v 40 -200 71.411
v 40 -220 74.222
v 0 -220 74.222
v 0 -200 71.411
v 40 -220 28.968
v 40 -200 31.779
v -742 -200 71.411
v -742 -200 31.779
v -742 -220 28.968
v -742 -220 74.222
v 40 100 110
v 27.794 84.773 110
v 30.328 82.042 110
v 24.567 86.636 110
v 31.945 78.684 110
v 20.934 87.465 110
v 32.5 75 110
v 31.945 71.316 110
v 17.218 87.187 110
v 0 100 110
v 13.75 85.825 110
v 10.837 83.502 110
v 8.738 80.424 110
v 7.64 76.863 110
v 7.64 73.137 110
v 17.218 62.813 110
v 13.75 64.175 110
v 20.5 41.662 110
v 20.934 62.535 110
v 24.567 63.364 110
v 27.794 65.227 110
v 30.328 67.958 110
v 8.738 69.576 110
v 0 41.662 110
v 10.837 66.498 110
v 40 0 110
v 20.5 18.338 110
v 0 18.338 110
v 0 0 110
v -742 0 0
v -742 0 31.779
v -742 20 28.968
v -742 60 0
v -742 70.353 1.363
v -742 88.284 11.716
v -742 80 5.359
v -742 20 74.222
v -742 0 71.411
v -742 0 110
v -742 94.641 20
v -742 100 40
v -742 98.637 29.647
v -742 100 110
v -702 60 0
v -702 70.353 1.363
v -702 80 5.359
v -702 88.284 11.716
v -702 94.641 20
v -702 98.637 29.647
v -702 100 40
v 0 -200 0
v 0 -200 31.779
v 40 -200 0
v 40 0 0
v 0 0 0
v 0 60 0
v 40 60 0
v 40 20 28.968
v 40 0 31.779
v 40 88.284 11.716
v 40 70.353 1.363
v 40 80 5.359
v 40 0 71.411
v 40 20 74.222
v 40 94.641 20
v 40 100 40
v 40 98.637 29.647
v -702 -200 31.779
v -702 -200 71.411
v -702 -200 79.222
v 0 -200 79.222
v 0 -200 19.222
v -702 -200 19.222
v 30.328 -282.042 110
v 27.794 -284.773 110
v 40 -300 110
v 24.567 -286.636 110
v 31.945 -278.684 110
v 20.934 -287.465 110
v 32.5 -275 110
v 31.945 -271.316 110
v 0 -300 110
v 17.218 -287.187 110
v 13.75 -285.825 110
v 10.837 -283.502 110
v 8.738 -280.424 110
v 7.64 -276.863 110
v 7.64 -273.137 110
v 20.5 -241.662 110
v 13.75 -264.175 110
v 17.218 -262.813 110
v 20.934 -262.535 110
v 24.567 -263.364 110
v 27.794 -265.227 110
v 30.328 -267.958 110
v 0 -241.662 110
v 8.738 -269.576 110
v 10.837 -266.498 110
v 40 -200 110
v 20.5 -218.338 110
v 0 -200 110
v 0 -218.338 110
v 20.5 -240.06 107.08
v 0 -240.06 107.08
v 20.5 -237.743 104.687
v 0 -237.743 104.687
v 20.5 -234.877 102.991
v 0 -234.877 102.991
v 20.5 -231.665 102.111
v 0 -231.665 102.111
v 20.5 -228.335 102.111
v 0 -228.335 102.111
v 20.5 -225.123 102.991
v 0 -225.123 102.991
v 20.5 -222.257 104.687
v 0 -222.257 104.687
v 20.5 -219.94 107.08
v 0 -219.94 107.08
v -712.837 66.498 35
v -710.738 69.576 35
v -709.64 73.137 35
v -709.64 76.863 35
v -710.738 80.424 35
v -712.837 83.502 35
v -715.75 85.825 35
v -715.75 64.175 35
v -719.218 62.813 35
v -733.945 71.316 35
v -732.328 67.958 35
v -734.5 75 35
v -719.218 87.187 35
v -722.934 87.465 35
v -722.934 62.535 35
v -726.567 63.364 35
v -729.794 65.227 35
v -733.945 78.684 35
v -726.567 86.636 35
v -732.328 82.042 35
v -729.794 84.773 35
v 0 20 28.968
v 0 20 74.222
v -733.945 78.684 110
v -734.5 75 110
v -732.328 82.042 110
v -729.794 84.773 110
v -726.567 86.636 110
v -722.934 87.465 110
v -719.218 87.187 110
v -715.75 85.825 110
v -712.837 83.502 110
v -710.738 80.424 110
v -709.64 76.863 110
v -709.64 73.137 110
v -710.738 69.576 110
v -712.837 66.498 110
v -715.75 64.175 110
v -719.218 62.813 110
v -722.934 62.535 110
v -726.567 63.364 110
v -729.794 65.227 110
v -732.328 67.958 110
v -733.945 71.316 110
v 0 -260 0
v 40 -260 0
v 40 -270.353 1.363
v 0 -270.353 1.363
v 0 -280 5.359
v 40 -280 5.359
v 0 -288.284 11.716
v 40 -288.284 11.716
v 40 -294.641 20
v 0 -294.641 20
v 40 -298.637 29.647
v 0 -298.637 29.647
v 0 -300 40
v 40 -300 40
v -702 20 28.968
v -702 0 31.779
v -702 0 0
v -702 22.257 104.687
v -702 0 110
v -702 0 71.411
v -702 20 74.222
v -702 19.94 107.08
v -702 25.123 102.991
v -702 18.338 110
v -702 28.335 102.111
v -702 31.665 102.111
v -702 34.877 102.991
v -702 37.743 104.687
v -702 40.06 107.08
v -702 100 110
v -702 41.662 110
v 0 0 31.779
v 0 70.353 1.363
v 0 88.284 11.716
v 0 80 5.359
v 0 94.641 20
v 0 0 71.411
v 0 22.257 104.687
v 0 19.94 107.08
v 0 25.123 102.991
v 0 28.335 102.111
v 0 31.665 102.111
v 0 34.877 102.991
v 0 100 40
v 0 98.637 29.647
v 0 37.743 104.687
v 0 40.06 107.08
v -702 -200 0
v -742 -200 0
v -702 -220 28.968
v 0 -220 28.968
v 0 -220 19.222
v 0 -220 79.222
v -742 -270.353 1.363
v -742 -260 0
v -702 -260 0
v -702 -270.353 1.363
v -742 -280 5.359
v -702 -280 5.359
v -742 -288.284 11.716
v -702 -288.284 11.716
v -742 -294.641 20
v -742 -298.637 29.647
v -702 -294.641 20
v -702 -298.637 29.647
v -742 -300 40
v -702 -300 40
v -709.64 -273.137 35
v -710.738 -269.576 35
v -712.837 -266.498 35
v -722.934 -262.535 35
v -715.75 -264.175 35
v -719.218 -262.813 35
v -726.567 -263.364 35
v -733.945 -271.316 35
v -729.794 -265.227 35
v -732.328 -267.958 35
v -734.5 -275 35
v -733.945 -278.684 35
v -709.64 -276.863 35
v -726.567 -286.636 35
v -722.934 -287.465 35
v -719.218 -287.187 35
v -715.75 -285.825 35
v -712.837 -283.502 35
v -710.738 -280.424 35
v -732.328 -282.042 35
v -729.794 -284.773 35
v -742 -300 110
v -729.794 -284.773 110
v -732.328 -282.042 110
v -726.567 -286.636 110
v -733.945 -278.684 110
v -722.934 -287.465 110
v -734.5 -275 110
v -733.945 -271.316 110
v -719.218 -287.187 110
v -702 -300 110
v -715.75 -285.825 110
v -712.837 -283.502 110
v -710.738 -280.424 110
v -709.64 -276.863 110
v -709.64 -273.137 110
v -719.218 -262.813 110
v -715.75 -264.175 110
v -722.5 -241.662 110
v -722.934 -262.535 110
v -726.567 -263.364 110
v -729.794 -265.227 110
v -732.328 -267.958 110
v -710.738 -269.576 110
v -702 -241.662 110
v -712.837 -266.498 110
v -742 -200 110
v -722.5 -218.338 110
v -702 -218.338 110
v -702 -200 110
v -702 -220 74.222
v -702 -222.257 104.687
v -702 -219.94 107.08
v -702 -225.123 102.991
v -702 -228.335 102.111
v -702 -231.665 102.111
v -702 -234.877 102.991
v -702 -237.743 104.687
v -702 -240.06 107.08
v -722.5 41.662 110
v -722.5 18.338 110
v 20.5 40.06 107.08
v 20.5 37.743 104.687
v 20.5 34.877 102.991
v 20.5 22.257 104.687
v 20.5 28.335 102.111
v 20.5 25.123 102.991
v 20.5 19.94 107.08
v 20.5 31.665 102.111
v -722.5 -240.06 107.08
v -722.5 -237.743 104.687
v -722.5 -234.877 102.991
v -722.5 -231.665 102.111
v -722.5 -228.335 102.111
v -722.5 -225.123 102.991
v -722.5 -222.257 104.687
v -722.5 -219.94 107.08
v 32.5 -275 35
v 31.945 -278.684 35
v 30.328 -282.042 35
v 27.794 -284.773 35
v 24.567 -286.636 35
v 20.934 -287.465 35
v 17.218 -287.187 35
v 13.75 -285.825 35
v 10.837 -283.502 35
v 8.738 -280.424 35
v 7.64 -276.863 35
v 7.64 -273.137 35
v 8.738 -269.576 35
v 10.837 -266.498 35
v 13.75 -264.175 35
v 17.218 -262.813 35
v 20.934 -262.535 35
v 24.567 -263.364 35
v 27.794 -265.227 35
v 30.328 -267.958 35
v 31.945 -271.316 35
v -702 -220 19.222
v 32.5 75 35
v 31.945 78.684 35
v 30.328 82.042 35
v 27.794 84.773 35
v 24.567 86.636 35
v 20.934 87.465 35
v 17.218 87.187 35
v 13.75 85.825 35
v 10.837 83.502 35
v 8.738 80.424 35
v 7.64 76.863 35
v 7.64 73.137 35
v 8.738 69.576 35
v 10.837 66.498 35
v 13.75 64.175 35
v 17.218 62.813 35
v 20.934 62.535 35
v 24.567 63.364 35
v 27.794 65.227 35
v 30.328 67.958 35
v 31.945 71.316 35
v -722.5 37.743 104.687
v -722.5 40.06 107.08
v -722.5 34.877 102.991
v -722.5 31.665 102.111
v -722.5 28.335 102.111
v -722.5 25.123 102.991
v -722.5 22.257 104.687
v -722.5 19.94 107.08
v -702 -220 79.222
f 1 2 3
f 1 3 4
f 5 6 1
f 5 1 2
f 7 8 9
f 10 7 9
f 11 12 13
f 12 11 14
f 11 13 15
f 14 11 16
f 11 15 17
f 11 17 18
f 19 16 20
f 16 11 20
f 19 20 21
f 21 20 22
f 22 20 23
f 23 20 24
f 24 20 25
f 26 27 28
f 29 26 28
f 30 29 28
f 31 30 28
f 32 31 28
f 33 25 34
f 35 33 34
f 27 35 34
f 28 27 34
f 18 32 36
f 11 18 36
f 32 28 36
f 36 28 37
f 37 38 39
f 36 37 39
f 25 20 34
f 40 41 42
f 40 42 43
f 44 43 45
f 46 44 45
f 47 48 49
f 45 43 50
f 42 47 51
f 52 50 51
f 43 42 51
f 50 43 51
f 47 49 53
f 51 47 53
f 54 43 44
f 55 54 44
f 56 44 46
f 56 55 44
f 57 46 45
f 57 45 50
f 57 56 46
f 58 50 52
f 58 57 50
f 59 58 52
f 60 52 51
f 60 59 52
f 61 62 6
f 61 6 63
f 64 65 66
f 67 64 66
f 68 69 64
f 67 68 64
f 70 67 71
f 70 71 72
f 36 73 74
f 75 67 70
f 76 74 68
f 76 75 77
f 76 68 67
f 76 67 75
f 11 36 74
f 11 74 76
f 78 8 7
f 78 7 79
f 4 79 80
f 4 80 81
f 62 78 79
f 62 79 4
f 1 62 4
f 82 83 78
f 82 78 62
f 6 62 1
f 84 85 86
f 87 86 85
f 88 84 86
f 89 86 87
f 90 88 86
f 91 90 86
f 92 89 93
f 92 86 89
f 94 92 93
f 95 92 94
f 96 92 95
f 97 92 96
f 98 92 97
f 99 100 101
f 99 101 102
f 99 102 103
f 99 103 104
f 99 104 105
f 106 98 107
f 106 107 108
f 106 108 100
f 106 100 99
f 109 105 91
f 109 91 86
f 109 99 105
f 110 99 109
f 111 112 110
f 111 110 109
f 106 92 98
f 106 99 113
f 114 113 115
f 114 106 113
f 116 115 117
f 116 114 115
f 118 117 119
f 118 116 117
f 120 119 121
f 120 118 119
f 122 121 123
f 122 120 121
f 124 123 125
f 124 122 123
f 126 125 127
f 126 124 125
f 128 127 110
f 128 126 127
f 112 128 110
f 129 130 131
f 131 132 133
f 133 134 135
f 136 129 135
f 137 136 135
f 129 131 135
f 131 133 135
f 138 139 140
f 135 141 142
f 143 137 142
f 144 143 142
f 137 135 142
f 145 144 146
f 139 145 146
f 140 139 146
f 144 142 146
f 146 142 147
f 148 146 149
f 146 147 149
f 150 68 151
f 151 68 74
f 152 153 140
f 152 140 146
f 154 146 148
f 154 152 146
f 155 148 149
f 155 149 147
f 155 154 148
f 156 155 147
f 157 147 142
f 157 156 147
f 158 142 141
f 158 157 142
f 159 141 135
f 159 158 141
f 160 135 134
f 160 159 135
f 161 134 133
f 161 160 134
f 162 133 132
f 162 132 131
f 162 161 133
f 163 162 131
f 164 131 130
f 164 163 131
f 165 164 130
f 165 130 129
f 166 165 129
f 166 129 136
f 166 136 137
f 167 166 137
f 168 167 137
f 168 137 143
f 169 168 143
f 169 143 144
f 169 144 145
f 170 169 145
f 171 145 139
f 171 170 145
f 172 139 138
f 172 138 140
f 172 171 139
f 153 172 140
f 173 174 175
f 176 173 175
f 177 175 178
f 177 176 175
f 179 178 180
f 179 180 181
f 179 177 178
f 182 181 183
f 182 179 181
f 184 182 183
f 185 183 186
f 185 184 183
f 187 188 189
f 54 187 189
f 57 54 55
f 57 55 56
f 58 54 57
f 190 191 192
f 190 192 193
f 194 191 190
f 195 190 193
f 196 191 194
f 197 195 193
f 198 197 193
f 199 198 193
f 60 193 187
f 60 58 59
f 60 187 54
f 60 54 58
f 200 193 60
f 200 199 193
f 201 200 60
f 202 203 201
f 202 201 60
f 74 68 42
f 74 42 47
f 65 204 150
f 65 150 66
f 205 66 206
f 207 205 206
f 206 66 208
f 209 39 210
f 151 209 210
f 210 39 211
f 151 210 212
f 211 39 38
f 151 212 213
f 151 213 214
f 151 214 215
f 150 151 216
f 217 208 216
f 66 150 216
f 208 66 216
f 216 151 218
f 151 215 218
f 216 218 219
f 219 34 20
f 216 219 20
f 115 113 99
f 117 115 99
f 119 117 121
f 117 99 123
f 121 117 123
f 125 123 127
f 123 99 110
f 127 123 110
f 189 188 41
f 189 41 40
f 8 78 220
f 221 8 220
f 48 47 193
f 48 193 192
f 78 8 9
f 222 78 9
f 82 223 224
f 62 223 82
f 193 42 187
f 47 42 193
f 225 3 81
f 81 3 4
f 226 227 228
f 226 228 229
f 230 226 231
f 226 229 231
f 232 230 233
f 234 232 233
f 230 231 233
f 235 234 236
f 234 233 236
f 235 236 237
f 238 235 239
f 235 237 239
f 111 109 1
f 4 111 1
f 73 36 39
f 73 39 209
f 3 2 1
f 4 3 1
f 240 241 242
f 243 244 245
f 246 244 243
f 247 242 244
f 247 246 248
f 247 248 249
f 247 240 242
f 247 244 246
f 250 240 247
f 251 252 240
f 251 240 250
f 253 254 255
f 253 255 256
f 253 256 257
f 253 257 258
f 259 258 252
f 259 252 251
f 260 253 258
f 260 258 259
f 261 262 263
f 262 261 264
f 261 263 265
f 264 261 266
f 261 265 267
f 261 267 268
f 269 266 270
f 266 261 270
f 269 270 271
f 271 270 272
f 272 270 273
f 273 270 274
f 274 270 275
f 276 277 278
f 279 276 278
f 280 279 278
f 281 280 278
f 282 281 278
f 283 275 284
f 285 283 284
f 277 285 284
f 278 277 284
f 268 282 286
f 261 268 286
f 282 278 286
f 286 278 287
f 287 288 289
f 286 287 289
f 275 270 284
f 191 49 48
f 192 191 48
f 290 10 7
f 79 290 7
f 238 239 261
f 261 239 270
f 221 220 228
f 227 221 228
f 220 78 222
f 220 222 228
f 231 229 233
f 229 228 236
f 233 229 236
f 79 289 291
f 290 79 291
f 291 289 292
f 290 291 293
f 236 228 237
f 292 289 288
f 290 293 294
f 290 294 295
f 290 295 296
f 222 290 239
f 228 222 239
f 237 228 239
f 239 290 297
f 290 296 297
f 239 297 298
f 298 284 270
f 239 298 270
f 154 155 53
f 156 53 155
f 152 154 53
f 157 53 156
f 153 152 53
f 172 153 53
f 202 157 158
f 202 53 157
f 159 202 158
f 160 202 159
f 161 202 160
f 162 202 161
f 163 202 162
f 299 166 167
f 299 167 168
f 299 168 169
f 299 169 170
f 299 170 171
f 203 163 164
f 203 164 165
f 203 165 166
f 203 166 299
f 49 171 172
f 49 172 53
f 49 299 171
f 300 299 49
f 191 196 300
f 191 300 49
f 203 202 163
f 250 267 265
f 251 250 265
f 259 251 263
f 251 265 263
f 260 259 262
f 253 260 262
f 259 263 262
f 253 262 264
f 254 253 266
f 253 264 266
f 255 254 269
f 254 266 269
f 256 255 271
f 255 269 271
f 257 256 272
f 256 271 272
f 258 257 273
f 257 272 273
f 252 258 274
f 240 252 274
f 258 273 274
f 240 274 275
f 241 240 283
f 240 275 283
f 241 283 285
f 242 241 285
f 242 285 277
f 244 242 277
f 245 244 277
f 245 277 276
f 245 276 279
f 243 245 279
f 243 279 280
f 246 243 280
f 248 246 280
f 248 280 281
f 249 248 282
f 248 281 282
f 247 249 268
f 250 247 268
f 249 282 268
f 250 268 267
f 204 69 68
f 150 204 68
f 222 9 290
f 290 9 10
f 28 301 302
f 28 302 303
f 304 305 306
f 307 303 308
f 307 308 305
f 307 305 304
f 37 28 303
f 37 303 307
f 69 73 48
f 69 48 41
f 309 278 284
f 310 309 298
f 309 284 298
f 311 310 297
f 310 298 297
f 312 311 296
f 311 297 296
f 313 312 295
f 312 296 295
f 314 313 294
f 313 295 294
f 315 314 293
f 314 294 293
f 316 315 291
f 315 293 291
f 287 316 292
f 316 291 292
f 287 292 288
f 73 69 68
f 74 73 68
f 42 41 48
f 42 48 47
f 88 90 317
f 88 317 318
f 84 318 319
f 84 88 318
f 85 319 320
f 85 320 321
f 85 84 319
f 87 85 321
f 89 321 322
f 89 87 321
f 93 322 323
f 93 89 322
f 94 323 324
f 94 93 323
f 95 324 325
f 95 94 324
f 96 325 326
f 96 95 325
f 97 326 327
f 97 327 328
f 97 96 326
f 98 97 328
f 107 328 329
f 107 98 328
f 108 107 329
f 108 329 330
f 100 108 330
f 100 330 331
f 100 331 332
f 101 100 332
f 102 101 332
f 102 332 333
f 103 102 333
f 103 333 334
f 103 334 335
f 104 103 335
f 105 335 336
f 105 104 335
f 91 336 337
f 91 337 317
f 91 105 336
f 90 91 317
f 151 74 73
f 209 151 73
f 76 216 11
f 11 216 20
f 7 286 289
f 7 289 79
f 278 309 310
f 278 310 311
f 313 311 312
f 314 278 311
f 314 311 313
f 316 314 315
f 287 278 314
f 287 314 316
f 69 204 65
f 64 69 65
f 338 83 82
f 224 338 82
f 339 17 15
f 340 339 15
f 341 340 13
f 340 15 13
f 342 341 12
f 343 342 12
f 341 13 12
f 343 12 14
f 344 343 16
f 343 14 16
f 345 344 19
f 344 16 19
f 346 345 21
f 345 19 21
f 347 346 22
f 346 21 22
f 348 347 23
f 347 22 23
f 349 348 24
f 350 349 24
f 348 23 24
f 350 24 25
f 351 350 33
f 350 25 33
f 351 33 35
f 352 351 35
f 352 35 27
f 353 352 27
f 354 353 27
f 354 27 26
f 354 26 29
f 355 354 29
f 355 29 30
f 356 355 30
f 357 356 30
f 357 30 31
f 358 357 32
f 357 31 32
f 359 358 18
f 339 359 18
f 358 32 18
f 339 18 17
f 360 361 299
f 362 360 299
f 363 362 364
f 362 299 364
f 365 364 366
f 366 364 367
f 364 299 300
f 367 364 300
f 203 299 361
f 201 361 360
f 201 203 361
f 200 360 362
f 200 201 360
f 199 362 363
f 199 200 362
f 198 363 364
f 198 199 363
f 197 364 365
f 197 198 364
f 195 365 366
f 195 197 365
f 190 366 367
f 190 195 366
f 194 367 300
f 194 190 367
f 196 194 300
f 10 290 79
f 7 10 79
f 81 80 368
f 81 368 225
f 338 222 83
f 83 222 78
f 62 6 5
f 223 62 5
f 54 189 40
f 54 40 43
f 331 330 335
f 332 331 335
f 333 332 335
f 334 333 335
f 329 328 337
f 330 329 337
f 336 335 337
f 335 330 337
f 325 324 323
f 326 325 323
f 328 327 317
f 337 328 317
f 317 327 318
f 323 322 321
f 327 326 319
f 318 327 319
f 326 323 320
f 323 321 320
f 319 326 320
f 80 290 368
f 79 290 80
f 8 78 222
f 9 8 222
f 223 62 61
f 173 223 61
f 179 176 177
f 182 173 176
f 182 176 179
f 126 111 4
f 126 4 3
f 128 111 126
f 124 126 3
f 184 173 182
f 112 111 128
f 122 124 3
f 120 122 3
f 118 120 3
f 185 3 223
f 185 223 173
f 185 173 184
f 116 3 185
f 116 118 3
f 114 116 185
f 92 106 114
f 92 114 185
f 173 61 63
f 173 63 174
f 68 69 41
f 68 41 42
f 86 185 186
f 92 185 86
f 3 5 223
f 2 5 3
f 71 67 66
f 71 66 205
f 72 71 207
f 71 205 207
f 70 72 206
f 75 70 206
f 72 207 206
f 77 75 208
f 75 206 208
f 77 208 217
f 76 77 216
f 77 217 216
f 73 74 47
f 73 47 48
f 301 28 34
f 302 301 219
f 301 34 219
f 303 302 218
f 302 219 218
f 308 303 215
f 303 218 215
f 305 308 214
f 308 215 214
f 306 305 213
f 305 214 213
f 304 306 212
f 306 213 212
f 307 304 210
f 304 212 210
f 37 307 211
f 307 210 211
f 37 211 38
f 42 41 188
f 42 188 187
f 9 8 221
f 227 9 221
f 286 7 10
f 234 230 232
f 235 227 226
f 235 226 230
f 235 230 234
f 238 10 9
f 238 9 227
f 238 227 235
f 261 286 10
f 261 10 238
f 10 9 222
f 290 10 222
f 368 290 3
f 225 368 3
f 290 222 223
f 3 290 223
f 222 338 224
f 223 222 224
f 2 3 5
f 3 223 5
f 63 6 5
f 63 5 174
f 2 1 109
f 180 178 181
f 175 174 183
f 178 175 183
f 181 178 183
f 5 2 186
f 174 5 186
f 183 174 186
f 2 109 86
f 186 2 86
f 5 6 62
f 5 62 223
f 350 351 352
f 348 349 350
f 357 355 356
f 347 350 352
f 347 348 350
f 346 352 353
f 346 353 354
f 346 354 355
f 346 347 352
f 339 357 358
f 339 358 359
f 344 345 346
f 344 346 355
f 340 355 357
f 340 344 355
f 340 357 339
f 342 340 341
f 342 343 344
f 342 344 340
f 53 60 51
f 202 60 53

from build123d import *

# Parameters (mm, degrees)
F1_DEPTH       = 40
F2_R           = 12.5
F3_DEPTH       = 75
F4_R           = 12.5
F5_DEPTH       = 20.5
F7_DEPTH       = 40.001
F10_DEPTH      = 782
F14_W          = 702
F14_H          = 20
F15_DEPTH      = 55
F15_DEPTH_BACK = 5


with BuildPart() as f1:
    # F0 (on Right) → F1 (new body)
    with BuildSketch(Plane.YZ):
        with BuildLine():
            Line((0, 110), (0, 0))
            Line((0, 0), (60, 0))
            ThreePointArc((60, 0), (88.2842712475, 11.7157287525), (100, 40))
            Line((100, 40), (100, 110))
            Line((100, 110), (0, 110))
        make_face()
    extrude(amount=F1_DEPTH)

    # F2 (on face) → F3 (cut)
    with BuildSketch(Plane.XY.offset(110)):
        with Locations((20, 75)):
            Circle(F2_R)
    extrude(amount=-F3_DEPTH, mode=Mode.SUBTRACT)

    # F4 (on face) → F5 (cut)
    with BuildSketch(Plane(origin=(0, 0, 0), x_dir=(0, -1, 0), z_dir=(-1, 0, 0))):
        with Locations((-30, 114.5)):
            Circle(F4_R)
    extrude(amount=-F5_DEPTH, mode=Mode.SUBTRACT)

    # F6 (on face) → F7 (cut, through all)
    with BuildSketch(Plane.YZ.offset(40)):
        Polygon((20, 74.2220271416), (0, 71.4112104475), (0, 56.4112104475), (0, 31.7791700363), (20, 28.9683533423), (20, 46.7791700363), (20, 56.4112104475), align=None)
    extrude(amount=-F7_DEPTH, mode=Mode.SUBTRACT)


with BuildPart() as f9_1:
    # F9: instance of F1
    add(f1.part.mirror(Plane.YZ.offset(-351)))


with BuildPart() as f10:
    # F6 (on face) → F10 (new body)
    with BuildSketch(Plane.YZ.offset(40)):
        Polygon((20, 74.2220271416), (0, 71.4112104475), (0, 56.4112104475), (0, 31.7791700363), (20, 28.9683533423), (20, 46.7791700363), (20, 56.4112104475), align=None)
    extrude(amount=-F10_DEPTH)


with BuildPart() as f12_1:
    # F12: instance of F1
    add(f1.part.mirror(Plane.XZ.offset(100)))


with BuildPart() as f12_2:
    # F12: instance of F10
    add(f10.part.mirror(Plane.XZ.offset(100)))

    # F14 (on plane+point) → F15 (join, two sides)
    with BuildSketch(Plane.XY.offset(74.2220271416)) as f15_sk:
        with Locations((-351, -210)):
            Rectangle(F14_W, F14_H)
    extrude(amount=-F15_DEPTH)
    extrude(f15_sk.sketch, amount=F15_DEPTH_BACK)


with BuildPart() as f12_3:
    # F12: instance of F9_1
    add(f9_1.part.mirror(Plane.XZ.offset(100)))


solid = Compound([f1.part, f9_1.part, f10.part, f12_1.part, f12_2.part, f12_3.part])
